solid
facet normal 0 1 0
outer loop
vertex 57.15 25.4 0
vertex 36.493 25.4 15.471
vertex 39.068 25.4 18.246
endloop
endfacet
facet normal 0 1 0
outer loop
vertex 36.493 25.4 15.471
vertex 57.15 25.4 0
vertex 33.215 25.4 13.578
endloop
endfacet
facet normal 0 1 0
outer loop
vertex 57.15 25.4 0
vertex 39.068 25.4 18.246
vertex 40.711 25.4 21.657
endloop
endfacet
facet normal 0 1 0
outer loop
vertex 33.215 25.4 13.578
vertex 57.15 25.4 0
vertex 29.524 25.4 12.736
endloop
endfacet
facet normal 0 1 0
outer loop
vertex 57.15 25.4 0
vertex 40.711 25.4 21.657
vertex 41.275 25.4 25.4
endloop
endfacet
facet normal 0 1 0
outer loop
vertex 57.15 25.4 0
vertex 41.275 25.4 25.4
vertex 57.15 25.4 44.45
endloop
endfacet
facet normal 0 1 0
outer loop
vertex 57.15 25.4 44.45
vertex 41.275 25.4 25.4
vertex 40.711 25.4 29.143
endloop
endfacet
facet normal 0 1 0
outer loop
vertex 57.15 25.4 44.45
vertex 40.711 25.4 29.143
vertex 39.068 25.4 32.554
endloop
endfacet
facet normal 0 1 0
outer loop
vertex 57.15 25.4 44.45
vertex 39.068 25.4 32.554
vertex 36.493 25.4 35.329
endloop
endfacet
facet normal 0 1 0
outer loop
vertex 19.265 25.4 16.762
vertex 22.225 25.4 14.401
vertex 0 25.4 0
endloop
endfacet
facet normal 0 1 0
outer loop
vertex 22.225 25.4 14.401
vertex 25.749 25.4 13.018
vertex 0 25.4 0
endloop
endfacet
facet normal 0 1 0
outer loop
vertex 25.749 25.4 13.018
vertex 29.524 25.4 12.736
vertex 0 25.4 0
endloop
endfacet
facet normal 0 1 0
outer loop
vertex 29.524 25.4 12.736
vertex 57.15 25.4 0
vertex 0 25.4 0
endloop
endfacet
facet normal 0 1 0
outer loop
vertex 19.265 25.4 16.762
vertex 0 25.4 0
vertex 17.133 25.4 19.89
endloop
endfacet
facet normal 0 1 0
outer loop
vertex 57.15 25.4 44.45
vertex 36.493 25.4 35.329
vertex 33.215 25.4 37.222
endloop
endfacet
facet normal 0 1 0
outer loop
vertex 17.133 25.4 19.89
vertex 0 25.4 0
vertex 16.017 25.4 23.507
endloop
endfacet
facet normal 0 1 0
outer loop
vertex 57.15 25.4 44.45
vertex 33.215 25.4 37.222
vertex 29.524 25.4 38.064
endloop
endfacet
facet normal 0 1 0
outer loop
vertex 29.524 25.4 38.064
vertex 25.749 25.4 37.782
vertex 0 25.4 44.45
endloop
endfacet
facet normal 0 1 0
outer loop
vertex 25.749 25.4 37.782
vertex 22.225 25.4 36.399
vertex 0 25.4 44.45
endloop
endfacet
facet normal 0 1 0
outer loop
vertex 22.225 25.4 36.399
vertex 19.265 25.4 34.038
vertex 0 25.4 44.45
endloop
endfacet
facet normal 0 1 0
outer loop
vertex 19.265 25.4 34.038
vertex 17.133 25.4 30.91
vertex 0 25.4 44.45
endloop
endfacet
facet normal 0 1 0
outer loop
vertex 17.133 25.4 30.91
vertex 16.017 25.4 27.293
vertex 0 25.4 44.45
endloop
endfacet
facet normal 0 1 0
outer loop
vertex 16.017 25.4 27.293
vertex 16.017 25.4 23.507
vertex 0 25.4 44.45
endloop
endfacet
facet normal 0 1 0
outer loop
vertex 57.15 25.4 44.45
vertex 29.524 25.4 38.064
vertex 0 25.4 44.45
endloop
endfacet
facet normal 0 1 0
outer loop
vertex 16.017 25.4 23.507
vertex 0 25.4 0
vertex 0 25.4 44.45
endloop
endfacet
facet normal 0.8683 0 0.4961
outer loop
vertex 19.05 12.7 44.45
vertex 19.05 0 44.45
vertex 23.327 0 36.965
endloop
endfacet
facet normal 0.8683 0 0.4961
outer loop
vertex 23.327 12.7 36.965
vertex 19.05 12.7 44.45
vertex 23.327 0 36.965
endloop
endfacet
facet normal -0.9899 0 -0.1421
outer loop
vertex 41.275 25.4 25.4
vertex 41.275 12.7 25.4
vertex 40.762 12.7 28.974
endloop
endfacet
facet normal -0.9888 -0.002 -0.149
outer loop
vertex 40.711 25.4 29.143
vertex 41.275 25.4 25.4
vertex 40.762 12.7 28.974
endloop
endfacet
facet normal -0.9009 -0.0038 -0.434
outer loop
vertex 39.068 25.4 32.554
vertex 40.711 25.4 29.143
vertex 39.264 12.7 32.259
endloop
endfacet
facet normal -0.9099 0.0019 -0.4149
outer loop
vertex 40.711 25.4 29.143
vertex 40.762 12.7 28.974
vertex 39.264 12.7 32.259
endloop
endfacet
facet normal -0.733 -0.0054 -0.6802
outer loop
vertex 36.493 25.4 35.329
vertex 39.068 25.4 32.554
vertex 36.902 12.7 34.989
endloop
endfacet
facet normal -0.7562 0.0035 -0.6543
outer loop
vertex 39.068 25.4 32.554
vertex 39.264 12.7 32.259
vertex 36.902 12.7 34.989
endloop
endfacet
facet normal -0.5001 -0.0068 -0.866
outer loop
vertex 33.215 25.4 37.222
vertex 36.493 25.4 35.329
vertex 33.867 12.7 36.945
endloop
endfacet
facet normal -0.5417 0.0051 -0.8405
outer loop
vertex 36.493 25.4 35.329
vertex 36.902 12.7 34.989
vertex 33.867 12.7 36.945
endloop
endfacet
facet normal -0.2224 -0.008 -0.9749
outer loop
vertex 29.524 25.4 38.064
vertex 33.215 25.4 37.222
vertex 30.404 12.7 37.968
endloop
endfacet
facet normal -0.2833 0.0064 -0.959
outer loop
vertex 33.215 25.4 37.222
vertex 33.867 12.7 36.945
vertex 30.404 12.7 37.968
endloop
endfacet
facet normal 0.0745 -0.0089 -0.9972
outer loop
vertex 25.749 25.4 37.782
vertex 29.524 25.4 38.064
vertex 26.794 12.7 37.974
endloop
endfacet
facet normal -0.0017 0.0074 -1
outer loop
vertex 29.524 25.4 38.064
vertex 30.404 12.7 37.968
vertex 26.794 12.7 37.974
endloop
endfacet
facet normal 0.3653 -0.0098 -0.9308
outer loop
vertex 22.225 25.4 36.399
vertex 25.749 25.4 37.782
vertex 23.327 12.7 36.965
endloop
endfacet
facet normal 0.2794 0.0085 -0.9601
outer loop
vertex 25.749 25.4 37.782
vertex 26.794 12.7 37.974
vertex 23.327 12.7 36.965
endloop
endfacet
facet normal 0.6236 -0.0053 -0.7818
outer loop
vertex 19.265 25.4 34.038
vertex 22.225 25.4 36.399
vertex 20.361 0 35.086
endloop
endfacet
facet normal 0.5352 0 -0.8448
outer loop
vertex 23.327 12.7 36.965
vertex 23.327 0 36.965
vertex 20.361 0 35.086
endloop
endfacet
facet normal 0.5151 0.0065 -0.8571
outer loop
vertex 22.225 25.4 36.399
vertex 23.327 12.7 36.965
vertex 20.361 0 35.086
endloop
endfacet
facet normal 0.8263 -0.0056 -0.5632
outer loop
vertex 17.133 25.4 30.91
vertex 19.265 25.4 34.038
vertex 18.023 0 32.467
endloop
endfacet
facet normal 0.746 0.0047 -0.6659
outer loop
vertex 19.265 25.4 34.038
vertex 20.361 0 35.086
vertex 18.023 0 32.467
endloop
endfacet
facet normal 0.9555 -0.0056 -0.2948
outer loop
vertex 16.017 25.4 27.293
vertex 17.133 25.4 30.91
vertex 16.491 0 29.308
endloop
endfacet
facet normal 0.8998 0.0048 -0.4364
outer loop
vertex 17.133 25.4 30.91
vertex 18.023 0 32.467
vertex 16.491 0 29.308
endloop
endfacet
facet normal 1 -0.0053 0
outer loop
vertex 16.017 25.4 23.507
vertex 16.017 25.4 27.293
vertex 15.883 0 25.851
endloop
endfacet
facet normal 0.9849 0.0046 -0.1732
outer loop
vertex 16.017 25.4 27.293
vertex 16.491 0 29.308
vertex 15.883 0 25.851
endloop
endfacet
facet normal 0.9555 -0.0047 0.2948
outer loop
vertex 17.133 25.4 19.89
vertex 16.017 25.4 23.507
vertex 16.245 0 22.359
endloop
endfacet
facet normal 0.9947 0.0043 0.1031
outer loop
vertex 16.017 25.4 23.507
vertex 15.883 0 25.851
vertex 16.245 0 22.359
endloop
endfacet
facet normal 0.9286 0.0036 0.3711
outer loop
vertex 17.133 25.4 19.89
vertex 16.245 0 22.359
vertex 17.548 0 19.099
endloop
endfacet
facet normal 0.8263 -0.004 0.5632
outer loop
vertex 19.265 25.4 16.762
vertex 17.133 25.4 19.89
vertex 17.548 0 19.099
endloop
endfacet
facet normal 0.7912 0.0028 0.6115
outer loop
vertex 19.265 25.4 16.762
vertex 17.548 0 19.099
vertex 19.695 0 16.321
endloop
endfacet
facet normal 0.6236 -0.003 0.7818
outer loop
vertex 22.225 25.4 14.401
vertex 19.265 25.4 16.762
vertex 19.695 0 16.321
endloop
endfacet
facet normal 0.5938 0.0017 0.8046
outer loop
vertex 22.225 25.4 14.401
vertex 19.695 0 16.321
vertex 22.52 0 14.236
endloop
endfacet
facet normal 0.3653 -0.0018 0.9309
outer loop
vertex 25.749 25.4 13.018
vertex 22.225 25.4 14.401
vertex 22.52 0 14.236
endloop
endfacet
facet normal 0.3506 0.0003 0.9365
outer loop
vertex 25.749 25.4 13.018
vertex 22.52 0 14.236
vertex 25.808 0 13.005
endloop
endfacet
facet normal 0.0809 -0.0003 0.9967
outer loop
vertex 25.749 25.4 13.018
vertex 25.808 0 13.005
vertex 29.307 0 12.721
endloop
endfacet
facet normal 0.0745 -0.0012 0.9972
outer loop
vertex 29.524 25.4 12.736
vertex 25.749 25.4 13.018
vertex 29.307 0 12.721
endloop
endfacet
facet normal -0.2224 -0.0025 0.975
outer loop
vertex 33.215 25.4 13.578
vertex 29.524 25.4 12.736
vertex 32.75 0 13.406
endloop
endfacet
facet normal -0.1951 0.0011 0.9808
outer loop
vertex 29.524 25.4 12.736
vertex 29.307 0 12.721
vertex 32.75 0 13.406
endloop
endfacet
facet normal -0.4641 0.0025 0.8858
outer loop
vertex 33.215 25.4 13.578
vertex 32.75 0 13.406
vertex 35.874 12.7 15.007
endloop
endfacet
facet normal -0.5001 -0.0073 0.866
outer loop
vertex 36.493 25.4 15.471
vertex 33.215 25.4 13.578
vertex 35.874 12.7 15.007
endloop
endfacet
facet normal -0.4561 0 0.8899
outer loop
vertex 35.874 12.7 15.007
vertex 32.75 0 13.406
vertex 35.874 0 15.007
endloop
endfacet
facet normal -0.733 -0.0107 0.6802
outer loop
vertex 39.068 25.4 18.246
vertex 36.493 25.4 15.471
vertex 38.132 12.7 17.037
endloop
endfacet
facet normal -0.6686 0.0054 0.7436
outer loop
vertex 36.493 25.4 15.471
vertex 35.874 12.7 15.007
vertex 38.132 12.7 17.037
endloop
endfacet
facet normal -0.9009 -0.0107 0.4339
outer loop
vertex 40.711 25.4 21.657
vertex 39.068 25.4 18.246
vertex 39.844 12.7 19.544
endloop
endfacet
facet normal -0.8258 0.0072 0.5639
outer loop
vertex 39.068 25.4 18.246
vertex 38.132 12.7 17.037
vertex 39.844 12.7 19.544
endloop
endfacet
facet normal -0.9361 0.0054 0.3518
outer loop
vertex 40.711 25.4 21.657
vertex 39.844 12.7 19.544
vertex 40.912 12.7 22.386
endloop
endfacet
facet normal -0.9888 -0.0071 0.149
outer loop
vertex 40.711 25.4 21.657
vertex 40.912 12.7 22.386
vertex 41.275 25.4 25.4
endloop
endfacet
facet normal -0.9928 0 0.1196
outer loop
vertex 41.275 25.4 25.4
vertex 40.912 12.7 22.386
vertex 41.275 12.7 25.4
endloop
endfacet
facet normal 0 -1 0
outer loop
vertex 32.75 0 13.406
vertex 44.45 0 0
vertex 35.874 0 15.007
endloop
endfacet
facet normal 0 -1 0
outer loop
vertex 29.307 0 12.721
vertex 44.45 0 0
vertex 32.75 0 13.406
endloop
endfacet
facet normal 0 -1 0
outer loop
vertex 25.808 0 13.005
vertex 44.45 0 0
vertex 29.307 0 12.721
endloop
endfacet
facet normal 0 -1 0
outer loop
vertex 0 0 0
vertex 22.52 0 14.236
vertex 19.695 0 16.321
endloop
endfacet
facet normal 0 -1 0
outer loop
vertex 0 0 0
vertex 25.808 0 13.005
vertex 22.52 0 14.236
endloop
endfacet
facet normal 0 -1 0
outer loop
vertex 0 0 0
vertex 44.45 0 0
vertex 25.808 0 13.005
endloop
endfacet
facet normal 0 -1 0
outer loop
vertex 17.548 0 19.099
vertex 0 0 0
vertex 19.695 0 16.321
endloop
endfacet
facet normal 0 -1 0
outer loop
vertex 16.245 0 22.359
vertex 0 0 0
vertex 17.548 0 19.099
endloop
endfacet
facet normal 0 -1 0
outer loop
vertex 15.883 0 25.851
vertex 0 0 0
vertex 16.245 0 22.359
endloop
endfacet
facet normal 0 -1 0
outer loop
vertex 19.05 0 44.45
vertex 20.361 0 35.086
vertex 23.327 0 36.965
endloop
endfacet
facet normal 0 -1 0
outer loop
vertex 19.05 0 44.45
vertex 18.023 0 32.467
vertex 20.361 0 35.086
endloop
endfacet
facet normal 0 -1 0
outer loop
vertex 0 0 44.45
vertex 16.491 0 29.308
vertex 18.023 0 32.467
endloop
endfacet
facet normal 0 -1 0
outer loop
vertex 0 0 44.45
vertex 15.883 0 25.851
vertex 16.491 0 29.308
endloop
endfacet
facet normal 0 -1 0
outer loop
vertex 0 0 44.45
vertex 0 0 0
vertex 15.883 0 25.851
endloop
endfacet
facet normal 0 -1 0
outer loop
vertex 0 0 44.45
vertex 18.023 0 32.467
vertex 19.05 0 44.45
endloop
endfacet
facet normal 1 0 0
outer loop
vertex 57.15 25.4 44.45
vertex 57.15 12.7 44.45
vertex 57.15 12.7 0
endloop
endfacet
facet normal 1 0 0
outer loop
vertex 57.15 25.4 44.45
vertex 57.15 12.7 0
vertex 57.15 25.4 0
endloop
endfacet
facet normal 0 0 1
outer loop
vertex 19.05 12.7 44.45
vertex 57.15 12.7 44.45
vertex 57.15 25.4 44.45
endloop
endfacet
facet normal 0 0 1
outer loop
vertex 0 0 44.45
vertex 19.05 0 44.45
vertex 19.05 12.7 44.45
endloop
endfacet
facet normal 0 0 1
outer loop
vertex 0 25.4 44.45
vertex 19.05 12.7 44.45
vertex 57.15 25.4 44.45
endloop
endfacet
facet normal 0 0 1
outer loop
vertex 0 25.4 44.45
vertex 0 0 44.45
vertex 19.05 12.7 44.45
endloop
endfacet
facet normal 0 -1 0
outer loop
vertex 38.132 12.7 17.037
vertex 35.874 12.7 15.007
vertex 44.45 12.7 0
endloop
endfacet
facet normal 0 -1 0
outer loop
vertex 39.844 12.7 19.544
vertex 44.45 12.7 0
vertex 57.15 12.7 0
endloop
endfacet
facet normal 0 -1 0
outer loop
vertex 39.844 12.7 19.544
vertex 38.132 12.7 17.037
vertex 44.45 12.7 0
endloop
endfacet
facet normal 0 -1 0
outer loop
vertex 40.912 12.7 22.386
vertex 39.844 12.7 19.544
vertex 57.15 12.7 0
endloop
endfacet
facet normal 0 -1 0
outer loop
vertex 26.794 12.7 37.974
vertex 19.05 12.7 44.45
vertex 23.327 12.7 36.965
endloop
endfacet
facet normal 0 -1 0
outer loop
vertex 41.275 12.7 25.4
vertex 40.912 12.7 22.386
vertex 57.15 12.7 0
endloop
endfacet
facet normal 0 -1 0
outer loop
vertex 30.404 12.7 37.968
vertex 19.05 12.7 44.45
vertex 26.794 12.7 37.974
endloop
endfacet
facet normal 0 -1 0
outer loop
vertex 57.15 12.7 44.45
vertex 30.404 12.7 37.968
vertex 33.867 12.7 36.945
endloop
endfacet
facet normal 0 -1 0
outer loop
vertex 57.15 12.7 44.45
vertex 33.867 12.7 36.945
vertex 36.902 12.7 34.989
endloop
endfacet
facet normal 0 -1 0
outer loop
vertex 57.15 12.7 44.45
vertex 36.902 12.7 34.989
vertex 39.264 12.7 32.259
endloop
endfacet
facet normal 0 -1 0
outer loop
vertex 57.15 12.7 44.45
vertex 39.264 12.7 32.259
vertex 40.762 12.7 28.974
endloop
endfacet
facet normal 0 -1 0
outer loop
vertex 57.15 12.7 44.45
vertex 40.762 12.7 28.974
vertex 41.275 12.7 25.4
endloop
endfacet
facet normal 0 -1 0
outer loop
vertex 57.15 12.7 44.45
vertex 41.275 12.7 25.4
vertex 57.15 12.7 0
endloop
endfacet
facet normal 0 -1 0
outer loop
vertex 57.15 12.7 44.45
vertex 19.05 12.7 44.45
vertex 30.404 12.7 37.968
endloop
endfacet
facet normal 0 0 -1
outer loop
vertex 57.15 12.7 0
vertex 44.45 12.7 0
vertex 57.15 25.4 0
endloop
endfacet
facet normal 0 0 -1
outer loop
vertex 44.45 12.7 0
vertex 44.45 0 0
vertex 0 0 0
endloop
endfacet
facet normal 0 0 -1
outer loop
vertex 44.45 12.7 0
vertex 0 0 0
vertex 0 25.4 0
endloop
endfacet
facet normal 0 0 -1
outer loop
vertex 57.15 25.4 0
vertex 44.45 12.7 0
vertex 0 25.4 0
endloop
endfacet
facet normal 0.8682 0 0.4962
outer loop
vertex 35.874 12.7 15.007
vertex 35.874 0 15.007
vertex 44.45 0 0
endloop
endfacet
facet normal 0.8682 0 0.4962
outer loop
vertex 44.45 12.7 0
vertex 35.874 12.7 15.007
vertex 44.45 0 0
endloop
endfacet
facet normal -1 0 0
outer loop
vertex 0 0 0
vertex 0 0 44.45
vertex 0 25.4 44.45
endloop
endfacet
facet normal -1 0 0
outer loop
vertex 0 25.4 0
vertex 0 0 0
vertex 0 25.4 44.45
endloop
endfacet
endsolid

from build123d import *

# Parameters (mm, degrees)
F0_W     = 25.4
F0_H     = 44.45
F1_DEPTH = 57.15
F2_R     = 12.7
F3_DEPTH = 25.4
F4_W     = 12.7
F4_H     = 44.45
F5_DEPTH = 12.7


with BuildPart() as f1:
    # F0 (on Right) → F1 (new body)
    with BuildSketch(Plane.YZ):
        with Locations((12.7, 22.225)):
            Rectangle(F0_W, F0_H)
    extrude(amount=F1_DEPTH)

    # F2 (on face) → F3 (cut)
    with BuildSketch(Plane.XZ):
        with Locations((28.575, 25.4)):
            Circle(F2_R)
    extrude(amount=-F3_DEPTH, mode=Mode.SUBTRACT)

    # F4 (on face) → F5 (cut)
    with BuildSketch(Plane.XZ):
        with BuildLine():
            Line((44.45, 0), (44.45, 44.45))
            Line((44.45, 44.45), (19.05, 44.45))
            Line((19.05, 44.45), (23.3271277432, 36.9650264494))
            ThreePointArc((23.3271277432, 36.9650264494), (35.4540269057, 36.0756259222), (41.275, 25.4))
            ThreePointArc((41.275, 25.4), (39.8442616467, 19.5439141111), (35.8744107184, 15.0072812429))
            Line((35.8744107184, 15.0072812429), (44.45, 0))
        make_face()
        with Locations((50.8, 22.225)):
            Rectangle(F4_W, F4_H)
    extrude(amount=-F5_DEPTH, mode=Mode.SUBTRACT)


solid = f1.part
